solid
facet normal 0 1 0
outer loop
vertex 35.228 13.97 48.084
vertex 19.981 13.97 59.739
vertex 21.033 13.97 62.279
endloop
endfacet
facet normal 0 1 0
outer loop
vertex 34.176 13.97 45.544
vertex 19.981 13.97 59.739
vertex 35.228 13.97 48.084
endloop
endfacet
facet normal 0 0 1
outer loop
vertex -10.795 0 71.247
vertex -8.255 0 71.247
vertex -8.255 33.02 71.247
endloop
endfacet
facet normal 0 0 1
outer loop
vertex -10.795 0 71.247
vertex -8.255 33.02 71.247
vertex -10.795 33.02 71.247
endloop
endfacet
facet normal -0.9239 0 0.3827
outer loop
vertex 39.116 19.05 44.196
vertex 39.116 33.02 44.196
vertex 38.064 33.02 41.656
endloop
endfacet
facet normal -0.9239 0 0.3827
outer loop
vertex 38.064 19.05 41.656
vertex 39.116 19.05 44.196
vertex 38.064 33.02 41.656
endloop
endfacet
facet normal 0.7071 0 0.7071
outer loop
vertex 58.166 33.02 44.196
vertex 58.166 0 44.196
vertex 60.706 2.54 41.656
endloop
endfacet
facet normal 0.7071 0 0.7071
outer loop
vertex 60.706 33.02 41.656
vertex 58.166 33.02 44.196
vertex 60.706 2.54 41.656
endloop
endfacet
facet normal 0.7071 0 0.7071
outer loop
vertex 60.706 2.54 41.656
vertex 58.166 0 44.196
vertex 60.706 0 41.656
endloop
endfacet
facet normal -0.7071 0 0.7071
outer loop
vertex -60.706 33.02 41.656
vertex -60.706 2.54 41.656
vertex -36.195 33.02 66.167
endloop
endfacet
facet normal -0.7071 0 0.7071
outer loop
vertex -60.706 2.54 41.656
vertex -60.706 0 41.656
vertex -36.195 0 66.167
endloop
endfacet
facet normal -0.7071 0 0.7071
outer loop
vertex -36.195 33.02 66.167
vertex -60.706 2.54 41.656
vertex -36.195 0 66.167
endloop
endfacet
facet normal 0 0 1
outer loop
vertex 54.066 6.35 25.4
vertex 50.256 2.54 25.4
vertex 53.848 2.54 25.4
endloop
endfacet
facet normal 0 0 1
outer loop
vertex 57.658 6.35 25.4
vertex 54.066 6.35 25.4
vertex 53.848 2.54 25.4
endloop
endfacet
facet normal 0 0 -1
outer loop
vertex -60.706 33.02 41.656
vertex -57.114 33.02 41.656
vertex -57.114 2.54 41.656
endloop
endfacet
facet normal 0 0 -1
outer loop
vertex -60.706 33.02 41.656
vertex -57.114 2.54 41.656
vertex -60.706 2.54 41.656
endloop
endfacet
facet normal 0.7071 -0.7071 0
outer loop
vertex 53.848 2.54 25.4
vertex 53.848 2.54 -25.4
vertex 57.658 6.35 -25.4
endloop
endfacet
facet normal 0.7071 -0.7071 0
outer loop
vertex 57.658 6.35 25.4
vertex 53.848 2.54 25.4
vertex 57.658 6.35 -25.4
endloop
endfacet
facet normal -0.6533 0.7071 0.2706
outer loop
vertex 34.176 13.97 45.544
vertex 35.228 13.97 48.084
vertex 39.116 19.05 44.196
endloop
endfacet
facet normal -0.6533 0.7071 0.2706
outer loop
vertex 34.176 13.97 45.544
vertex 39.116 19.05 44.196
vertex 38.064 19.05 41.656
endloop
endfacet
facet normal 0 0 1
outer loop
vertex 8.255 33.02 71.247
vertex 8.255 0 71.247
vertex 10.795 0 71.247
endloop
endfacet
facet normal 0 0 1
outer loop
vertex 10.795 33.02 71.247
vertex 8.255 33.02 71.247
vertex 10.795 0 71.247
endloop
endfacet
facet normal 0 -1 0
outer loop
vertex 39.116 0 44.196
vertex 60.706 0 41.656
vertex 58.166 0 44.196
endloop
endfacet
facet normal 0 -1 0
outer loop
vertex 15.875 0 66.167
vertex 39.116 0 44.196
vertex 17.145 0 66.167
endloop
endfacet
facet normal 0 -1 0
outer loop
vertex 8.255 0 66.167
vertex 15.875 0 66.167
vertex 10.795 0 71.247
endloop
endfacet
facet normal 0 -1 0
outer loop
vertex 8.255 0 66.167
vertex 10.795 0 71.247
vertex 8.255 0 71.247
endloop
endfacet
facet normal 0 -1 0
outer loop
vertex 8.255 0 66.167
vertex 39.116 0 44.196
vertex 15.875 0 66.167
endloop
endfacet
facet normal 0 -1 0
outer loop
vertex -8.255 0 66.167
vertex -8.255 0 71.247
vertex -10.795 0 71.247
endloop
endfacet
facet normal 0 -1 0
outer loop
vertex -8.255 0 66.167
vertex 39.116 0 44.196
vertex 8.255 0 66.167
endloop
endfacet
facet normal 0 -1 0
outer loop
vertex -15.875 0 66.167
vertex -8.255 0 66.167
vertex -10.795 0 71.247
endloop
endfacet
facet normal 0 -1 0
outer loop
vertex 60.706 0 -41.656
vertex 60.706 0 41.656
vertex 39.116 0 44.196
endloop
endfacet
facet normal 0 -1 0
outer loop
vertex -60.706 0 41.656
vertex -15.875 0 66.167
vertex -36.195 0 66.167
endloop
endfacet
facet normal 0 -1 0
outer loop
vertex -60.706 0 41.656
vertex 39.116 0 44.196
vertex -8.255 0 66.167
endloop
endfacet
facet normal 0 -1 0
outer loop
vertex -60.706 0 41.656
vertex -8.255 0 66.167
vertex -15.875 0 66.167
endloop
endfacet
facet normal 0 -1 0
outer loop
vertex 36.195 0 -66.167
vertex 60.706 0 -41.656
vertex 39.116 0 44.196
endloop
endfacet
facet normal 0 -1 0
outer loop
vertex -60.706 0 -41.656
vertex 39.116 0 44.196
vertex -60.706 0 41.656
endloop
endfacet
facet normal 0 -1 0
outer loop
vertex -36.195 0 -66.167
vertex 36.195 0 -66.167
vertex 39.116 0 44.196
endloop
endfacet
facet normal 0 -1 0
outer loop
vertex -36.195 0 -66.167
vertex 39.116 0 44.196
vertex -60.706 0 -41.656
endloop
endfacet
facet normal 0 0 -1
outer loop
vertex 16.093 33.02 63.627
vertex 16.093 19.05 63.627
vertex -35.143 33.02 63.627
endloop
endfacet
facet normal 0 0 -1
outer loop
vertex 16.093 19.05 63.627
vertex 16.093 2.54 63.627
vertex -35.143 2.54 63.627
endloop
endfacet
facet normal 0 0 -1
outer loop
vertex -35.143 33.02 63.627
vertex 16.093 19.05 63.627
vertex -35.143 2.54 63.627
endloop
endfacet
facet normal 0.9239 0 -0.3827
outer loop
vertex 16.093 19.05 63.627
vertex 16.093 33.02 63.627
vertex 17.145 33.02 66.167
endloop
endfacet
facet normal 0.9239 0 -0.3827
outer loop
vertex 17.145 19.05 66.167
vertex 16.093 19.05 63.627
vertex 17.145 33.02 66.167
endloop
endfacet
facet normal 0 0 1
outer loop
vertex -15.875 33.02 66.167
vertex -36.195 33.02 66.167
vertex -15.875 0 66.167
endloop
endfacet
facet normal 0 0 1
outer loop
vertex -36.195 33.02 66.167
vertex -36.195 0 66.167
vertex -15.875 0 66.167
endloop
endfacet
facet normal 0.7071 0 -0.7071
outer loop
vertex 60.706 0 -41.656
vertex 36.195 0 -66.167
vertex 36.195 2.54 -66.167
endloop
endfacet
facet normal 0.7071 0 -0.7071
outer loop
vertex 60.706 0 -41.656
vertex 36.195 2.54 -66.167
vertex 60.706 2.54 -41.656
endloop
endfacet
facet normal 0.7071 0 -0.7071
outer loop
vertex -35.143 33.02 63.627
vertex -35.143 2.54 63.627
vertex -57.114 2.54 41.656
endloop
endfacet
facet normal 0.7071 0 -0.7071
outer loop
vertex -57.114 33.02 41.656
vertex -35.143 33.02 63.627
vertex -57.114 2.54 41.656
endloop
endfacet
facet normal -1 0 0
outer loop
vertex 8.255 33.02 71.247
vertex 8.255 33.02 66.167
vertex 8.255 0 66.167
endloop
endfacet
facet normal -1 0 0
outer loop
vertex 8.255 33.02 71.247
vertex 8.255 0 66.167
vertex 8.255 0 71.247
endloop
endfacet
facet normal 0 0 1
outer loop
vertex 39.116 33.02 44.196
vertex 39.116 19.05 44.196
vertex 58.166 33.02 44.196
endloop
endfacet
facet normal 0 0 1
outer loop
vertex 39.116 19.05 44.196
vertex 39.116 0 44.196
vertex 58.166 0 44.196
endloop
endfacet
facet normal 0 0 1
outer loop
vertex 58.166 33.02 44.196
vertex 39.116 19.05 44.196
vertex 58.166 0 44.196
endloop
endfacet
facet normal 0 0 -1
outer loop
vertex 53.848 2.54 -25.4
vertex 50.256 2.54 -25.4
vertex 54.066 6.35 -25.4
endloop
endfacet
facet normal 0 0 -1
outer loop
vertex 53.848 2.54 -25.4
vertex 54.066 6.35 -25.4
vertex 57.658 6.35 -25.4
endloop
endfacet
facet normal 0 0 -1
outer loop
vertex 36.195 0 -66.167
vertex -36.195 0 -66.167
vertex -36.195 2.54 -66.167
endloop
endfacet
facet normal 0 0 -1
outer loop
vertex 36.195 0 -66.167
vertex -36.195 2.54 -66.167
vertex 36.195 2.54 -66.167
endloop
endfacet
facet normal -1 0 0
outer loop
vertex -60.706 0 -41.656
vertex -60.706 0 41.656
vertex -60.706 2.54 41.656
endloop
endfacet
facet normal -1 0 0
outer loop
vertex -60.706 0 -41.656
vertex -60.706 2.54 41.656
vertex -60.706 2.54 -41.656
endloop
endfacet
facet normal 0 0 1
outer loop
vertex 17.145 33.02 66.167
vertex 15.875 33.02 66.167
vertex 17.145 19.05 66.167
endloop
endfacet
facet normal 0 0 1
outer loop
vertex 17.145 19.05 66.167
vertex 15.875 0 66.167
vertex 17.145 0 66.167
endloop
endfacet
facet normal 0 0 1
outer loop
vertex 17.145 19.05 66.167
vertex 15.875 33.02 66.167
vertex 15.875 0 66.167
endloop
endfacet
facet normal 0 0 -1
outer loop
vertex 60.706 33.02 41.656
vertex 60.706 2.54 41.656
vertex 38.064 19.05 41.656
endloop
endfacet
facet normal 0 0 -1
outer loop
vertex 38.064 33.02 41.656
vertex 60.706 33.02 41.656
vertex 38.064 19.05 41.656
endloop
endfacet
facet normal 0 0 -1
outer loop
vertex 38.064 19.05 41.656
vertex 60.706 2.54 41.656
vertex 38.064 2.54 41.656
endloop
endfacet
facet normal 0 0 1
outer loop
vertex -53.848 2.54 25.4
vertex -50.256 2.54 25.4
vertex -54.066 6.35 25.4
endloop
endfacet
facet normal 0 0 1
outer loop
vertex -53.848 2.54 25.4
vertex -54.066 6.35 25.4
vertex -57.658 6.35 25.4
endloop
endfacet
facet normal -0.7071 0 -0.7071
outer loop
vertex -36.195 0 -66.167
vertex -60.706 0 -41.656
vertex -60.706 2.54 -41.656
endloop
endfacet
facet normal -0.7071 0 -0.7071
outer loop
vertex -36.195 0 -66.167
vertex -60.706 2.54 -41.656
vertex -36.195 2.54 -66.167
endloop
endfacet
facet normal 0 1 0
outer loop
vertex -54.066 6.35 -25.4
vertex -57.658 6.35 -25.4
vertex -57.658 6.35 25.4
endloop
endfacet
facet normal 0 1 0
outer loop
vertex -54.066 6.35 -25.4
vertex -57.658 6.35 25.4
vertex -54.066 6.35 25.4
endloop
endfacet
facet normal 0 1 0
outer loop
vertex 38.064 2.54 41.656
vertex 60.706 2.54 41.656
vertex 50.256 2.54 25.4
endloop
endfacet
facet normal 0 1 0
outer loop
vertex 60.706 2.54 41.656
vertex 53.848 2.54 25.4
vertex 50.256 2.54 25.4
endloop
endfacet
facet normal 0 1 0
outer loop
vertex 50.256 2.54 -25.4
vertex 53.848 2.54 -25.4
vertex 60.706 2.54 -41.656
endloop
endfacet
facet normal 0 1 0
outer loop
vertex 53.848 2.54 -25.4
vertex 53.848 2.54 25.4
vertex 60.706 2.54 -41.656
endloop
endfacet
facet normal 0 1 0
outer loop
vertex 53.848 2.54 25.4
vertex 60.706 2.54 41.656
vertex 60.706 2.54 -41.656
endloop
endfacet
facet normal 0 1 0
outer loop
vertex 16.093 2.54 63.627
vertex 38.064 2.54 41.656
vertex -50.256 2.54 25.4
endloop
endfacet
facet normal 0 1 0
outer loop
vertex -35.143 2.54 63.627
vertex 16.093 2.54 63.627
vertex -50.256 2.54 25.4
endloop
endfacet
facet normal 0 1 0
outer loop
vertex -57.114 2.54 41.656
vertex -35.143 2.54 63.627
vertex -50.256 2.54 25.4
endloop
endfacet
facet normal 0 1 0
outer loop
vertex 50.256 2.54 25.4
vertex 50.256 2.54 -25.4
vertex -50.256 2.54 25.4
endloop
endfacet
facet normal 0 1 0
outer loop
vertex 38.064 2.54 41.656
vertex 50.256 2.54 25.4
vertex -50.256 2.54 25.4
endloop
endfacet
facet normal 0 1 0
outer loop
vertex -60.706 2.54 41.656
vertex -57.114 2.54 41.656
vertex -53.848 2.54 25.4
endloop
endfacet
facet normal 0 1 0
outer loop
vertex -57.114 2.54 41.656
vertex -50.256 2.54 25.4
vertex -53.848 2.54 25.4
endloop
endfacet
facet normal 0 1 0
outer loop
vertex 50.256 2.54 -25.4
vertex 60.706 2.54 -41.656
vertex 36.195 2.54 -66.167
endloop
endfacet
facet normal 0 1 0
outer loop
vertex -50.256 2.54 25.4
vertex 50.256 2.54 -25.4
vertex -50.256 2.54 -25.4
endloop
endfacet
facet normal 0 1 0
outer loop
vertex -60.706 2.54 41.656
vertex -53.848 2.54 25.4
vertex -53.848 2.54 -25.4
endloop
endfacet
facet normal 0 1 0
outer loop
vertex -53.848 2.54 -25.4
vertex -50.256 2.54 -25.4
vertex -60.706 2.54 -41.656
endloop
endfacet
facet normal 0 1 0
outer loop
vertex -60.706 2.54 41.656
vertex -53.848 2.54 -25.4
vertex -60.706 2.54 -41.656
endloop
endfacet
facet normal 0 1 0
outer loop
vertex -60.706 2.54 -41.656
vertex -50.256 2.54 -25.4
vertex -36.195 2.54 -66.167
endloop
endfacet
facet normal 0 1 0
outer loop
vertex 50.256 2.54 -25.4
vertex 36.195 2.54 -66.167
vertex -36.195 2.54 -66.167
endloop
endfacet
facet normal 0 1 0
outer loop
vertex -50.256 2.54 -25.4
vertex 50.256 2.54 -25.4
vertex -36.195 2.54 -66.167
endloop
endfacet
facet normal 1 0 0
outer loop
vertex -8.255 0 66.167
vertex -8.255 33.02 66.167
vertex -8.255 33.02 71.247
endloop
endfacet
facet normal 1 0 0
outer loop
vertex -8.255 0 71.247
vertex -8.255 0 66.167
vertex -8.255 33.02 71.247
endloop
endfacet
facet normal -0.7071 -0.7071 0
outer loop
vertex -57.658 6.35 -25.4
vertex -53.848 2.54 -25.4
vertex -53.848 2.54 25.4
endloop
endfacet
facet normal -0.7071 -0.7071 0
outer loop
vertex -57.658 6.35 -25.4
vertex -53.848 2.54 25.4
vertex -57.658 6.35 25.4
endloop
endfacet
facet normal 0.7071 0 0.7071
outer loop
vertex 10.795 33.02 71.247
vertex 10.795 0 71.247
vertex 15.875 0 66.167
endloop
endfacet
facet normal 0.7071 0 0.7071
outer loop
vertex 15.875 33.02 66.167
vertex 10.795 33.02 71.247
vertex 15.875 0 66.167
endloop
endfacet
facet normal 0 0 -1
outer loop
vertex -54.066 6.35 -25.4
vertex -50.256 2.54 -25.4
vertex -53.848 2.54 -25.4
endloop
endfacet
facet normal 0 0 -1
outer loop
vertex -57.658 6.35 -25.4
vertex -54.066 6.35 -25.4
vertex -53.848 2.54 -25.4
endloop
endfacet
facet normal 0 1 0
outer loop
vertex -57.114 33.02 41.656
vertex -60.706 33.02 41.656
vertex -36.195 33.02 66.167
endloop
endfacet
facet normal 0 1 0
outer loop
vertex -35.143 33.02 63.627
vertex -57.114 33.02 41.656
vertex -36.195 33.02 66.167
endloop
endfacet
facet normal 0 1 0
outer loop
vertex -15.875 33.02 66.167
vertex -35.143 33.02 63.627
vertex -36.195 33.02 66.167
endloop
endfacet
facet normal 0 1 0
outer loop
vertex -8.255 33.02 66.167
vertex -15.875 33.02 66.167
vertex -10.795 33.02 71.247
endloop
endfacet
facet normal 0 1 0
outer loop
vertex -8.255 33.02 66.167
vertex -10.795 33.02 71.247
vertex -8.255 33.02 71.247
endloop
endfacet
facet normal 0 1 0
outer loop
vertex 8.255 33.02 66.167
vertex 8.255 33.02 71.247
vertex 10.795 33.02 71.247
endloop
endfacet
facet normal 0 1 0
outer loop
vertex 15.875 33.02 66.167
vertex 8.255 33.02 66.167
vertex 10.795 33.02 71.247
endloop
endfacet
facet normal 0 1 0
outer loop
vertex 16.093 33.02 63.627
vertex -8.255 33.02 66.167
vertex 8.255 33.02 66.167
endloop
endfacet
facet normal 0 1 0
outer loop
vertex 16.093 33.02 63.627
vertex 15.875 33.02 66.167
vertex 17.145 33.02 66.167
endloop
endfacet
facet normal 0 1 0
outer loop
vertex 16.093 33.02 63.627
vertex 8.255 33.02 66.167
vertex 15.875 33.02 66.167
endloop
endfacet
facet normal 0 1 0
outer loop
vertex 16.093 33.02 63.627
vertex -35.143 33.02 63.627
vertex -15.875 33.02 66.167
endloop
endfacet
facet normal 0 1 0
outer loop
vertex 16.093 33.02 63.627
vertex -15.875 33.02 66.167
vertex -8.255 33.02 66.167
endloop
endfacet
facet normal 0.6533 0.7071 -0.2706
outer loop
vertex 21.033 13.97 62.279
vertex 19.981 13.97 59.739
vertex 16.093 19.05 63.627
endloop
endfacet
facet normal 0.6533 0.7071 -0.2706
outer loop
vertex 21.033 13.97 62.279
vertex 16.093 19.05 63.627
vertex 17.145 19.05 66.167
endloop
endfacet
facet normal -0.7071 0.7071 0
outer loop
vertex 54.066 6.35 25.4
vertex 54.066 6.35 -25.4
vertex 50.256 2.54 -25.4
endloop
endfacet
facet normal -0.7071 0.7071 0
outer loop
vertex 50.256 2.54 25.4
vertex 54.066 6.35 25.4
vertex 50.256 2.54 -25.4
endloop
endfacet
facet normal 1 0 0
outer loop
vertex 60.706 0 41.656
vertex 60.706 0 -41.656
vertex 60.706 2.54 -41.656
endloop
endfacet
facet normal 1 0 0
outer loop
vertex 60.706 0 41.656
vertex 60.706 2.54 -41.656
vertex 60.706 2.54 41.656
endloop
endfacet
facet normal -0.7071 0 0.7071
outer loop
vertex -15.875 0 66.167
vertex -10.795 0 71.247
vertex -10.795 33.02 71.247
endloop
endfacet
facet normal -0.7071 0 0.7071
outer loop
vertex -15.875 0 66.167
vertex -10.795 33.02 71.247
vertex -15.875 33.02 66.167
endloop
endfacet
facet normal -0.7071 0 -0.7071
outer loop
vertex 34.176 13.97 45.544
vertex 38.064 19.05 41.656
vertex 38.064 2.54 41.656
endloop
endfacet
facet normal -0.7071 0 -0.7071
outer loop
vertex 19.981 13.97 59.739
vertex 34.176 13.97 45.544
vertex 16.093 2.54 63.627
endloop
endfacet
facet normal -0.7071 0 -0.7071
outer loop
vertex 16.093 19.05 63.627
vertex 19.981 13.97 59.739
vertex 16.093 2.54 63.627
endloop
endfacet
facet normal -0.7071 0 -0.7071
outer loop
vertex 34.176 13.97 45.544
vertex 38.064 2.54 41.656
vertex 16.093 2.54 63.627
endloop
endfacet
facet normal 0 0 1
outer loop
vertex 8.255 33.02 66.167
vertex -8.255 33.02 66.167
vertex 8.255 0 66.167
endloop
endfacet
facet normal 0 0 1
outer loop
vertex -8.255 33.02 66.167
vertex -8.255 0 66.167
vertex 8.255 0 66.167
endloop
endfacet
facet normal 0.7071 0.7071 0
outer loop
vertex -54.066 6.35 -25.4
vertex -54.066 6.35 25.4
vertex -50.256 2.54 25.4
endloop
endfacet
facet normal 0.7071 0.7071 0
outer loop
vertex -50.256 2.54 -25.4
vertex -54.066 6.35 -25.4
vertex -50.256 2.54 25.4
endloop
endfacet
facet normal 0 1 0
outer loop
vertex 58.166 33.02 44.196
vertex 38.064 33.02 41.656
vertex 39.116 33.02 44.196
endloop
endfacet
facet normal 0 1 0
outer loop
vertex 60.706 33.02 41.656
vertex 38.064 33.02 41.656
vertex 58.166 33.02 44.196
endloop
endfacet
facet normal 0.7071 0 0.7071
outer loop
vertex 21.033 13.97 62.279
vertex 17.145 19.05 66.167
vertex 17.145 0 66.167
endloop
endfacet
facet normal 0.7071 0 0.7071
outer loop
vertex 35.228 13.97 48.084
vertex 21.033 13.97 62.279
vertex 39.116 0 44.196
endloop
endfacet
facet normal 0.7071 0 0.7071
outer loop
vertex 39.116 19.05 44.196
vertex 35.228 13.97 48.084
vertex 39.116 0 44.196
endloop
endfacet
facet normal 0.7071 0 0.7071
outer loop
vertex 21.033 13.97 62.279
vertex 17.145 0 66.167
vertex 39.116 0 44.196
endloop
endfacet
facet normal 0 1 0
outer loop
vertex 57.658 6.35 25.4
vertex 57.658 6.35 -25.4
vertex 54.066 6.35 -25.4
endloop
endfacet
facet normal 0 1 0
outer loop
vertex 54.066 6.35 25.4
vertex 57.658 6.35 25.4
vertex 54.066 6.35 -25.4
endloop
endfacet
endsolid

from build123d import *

# Parameters (mm, degrees)
BOSS_EXTRUDE1_DEPTH      = 2.54
CUT_EXTRUDE1_DEPTH       = 3.54
BOSS_EXTRUDE2_DEPTH      = 25.4
BOSS_EXTRUDE2_DEPTH_BACK = 25.4
BOSS_EXTRUDE3_DEPTH      = 30.48
CUT_EXTRUDE2_DEPTH       = 19.05
CHAMFER2_SIZE            = 5.08
BOSS_EXTRUDE4_DEPTH      = 33.02


with BuildPart() as part:
    # Sketch1 → Boss-Extrude1 (new body)
    with BuildSketch(Plane(origin=(0, 0, 0), x_dir=(1, 0, 0), z_dir=(0, 1, 0))):
        Polygon((-36.195, 66.167), (36.195, 66.167), (60.706, 41.656), (60.706, -41.656), (36.195, -66.167), (-36.195, -66.167), (-60.706, -41.656), (-60.706, 41.656), align=None)
    extrude(amount=BOSS_EXTRUDE1_DEPTH)

    # Sketch5 → Cut-Extrude1 (cut, through all)
    with BuildSketch(Plane(origin=(0, 2.54, 0), x_dir=(1, 0, 0), z_dir=(0, 1, 0))):
        Polygon((58.166, -44.196), (36.195, -66.167), (17.145, -66.167), (39.116, -44.196), align=None)
    extrude(amount=-CUT_EXTRUDE1_DEPTH, mode=Mode.SUBTRACT)

    # Sketch3 → Boss-Extrude2 (add, two sides)
    with BuildSketch(Plane.XY) as boss_extrude2_sk:
        Polygon((-53.848, 2.54), (-57.658, 6.35), (-54.065897552, 6.35), (-50.255897552, 2.54), align=None)
        Polygon((54.065897552, 6.35), (50.255897552, 2.54), (53.848, 2.54), (57.658, 6.35), align=None)
    extrude(amount=BOSS_EXTRUDE2_DEPTH)
    extrude(boss_extrude2_sk.sketch, amount=-BOSS_EXTRUDE2_DEPTH_BACK)

    # Sketch4 → Boss-Extrude3 (add)
    with BuildSketch(Plane(origin=(0, 2.54, 0), x_dir=(1, 0, 0), z_dir=(0, 1, 0))):
        Polygon((60.706, -41.656), (58.166, -41.656), (38.063897552, -41.656), (16.092897552, -63.627), (-35.142897552, -63.627), (-57.113897552, -41.656), (-60.706, -41.656), (-36.195, -66.167), (17.145, -66.167), (39.116, -44.196), (58.166, -44.196), align=None)
    extrude(amount=BOSS_EXTRUDE3_DEPTH)

    # Sketch6 → Cut-Extrude2 (cut)
    with BuildSketch(Plane(origin=(0, 33.02, 0), x_dir=(1, 0, 0), z_dir=(0, 1, 0))):
        Polygon((38.063897552, -41.656), (16.092897552, -63.627), (17.145, -66.167), (39.116, -44.196), align=None)
    extrude(amount=-CUT_EXTRUDE2_DEPTH, mode=Mode.SUBTRACT)

    # Chamfer2
    chamfer2_edges = [part.edges().sort_by_distance(p)[0] for p in [
        (16.618948776, 13.97, 64.897),
        (38.589948776, 13.97, 42.926),
    ]]
    chamfer(chamfer2_edges, length=CHAMFER2_SIZE)

    # Sketch7 → Boss-Extrude4 (add)
    with BuildSketch(Plane.XZ):
        Polygon((-8.255, 66.167), (-8.255, 71.247), (-10.795, 71.247), (-15.875, 66.167), align=None)
        Polygon((10.795, 71.247), (15.875, 66.167), (8.255, 66.167), (8.255, 71.247), align=None)
    extrude(amount=-BOSS_EXTRUDE4_DEPTH)


solid = part.part
